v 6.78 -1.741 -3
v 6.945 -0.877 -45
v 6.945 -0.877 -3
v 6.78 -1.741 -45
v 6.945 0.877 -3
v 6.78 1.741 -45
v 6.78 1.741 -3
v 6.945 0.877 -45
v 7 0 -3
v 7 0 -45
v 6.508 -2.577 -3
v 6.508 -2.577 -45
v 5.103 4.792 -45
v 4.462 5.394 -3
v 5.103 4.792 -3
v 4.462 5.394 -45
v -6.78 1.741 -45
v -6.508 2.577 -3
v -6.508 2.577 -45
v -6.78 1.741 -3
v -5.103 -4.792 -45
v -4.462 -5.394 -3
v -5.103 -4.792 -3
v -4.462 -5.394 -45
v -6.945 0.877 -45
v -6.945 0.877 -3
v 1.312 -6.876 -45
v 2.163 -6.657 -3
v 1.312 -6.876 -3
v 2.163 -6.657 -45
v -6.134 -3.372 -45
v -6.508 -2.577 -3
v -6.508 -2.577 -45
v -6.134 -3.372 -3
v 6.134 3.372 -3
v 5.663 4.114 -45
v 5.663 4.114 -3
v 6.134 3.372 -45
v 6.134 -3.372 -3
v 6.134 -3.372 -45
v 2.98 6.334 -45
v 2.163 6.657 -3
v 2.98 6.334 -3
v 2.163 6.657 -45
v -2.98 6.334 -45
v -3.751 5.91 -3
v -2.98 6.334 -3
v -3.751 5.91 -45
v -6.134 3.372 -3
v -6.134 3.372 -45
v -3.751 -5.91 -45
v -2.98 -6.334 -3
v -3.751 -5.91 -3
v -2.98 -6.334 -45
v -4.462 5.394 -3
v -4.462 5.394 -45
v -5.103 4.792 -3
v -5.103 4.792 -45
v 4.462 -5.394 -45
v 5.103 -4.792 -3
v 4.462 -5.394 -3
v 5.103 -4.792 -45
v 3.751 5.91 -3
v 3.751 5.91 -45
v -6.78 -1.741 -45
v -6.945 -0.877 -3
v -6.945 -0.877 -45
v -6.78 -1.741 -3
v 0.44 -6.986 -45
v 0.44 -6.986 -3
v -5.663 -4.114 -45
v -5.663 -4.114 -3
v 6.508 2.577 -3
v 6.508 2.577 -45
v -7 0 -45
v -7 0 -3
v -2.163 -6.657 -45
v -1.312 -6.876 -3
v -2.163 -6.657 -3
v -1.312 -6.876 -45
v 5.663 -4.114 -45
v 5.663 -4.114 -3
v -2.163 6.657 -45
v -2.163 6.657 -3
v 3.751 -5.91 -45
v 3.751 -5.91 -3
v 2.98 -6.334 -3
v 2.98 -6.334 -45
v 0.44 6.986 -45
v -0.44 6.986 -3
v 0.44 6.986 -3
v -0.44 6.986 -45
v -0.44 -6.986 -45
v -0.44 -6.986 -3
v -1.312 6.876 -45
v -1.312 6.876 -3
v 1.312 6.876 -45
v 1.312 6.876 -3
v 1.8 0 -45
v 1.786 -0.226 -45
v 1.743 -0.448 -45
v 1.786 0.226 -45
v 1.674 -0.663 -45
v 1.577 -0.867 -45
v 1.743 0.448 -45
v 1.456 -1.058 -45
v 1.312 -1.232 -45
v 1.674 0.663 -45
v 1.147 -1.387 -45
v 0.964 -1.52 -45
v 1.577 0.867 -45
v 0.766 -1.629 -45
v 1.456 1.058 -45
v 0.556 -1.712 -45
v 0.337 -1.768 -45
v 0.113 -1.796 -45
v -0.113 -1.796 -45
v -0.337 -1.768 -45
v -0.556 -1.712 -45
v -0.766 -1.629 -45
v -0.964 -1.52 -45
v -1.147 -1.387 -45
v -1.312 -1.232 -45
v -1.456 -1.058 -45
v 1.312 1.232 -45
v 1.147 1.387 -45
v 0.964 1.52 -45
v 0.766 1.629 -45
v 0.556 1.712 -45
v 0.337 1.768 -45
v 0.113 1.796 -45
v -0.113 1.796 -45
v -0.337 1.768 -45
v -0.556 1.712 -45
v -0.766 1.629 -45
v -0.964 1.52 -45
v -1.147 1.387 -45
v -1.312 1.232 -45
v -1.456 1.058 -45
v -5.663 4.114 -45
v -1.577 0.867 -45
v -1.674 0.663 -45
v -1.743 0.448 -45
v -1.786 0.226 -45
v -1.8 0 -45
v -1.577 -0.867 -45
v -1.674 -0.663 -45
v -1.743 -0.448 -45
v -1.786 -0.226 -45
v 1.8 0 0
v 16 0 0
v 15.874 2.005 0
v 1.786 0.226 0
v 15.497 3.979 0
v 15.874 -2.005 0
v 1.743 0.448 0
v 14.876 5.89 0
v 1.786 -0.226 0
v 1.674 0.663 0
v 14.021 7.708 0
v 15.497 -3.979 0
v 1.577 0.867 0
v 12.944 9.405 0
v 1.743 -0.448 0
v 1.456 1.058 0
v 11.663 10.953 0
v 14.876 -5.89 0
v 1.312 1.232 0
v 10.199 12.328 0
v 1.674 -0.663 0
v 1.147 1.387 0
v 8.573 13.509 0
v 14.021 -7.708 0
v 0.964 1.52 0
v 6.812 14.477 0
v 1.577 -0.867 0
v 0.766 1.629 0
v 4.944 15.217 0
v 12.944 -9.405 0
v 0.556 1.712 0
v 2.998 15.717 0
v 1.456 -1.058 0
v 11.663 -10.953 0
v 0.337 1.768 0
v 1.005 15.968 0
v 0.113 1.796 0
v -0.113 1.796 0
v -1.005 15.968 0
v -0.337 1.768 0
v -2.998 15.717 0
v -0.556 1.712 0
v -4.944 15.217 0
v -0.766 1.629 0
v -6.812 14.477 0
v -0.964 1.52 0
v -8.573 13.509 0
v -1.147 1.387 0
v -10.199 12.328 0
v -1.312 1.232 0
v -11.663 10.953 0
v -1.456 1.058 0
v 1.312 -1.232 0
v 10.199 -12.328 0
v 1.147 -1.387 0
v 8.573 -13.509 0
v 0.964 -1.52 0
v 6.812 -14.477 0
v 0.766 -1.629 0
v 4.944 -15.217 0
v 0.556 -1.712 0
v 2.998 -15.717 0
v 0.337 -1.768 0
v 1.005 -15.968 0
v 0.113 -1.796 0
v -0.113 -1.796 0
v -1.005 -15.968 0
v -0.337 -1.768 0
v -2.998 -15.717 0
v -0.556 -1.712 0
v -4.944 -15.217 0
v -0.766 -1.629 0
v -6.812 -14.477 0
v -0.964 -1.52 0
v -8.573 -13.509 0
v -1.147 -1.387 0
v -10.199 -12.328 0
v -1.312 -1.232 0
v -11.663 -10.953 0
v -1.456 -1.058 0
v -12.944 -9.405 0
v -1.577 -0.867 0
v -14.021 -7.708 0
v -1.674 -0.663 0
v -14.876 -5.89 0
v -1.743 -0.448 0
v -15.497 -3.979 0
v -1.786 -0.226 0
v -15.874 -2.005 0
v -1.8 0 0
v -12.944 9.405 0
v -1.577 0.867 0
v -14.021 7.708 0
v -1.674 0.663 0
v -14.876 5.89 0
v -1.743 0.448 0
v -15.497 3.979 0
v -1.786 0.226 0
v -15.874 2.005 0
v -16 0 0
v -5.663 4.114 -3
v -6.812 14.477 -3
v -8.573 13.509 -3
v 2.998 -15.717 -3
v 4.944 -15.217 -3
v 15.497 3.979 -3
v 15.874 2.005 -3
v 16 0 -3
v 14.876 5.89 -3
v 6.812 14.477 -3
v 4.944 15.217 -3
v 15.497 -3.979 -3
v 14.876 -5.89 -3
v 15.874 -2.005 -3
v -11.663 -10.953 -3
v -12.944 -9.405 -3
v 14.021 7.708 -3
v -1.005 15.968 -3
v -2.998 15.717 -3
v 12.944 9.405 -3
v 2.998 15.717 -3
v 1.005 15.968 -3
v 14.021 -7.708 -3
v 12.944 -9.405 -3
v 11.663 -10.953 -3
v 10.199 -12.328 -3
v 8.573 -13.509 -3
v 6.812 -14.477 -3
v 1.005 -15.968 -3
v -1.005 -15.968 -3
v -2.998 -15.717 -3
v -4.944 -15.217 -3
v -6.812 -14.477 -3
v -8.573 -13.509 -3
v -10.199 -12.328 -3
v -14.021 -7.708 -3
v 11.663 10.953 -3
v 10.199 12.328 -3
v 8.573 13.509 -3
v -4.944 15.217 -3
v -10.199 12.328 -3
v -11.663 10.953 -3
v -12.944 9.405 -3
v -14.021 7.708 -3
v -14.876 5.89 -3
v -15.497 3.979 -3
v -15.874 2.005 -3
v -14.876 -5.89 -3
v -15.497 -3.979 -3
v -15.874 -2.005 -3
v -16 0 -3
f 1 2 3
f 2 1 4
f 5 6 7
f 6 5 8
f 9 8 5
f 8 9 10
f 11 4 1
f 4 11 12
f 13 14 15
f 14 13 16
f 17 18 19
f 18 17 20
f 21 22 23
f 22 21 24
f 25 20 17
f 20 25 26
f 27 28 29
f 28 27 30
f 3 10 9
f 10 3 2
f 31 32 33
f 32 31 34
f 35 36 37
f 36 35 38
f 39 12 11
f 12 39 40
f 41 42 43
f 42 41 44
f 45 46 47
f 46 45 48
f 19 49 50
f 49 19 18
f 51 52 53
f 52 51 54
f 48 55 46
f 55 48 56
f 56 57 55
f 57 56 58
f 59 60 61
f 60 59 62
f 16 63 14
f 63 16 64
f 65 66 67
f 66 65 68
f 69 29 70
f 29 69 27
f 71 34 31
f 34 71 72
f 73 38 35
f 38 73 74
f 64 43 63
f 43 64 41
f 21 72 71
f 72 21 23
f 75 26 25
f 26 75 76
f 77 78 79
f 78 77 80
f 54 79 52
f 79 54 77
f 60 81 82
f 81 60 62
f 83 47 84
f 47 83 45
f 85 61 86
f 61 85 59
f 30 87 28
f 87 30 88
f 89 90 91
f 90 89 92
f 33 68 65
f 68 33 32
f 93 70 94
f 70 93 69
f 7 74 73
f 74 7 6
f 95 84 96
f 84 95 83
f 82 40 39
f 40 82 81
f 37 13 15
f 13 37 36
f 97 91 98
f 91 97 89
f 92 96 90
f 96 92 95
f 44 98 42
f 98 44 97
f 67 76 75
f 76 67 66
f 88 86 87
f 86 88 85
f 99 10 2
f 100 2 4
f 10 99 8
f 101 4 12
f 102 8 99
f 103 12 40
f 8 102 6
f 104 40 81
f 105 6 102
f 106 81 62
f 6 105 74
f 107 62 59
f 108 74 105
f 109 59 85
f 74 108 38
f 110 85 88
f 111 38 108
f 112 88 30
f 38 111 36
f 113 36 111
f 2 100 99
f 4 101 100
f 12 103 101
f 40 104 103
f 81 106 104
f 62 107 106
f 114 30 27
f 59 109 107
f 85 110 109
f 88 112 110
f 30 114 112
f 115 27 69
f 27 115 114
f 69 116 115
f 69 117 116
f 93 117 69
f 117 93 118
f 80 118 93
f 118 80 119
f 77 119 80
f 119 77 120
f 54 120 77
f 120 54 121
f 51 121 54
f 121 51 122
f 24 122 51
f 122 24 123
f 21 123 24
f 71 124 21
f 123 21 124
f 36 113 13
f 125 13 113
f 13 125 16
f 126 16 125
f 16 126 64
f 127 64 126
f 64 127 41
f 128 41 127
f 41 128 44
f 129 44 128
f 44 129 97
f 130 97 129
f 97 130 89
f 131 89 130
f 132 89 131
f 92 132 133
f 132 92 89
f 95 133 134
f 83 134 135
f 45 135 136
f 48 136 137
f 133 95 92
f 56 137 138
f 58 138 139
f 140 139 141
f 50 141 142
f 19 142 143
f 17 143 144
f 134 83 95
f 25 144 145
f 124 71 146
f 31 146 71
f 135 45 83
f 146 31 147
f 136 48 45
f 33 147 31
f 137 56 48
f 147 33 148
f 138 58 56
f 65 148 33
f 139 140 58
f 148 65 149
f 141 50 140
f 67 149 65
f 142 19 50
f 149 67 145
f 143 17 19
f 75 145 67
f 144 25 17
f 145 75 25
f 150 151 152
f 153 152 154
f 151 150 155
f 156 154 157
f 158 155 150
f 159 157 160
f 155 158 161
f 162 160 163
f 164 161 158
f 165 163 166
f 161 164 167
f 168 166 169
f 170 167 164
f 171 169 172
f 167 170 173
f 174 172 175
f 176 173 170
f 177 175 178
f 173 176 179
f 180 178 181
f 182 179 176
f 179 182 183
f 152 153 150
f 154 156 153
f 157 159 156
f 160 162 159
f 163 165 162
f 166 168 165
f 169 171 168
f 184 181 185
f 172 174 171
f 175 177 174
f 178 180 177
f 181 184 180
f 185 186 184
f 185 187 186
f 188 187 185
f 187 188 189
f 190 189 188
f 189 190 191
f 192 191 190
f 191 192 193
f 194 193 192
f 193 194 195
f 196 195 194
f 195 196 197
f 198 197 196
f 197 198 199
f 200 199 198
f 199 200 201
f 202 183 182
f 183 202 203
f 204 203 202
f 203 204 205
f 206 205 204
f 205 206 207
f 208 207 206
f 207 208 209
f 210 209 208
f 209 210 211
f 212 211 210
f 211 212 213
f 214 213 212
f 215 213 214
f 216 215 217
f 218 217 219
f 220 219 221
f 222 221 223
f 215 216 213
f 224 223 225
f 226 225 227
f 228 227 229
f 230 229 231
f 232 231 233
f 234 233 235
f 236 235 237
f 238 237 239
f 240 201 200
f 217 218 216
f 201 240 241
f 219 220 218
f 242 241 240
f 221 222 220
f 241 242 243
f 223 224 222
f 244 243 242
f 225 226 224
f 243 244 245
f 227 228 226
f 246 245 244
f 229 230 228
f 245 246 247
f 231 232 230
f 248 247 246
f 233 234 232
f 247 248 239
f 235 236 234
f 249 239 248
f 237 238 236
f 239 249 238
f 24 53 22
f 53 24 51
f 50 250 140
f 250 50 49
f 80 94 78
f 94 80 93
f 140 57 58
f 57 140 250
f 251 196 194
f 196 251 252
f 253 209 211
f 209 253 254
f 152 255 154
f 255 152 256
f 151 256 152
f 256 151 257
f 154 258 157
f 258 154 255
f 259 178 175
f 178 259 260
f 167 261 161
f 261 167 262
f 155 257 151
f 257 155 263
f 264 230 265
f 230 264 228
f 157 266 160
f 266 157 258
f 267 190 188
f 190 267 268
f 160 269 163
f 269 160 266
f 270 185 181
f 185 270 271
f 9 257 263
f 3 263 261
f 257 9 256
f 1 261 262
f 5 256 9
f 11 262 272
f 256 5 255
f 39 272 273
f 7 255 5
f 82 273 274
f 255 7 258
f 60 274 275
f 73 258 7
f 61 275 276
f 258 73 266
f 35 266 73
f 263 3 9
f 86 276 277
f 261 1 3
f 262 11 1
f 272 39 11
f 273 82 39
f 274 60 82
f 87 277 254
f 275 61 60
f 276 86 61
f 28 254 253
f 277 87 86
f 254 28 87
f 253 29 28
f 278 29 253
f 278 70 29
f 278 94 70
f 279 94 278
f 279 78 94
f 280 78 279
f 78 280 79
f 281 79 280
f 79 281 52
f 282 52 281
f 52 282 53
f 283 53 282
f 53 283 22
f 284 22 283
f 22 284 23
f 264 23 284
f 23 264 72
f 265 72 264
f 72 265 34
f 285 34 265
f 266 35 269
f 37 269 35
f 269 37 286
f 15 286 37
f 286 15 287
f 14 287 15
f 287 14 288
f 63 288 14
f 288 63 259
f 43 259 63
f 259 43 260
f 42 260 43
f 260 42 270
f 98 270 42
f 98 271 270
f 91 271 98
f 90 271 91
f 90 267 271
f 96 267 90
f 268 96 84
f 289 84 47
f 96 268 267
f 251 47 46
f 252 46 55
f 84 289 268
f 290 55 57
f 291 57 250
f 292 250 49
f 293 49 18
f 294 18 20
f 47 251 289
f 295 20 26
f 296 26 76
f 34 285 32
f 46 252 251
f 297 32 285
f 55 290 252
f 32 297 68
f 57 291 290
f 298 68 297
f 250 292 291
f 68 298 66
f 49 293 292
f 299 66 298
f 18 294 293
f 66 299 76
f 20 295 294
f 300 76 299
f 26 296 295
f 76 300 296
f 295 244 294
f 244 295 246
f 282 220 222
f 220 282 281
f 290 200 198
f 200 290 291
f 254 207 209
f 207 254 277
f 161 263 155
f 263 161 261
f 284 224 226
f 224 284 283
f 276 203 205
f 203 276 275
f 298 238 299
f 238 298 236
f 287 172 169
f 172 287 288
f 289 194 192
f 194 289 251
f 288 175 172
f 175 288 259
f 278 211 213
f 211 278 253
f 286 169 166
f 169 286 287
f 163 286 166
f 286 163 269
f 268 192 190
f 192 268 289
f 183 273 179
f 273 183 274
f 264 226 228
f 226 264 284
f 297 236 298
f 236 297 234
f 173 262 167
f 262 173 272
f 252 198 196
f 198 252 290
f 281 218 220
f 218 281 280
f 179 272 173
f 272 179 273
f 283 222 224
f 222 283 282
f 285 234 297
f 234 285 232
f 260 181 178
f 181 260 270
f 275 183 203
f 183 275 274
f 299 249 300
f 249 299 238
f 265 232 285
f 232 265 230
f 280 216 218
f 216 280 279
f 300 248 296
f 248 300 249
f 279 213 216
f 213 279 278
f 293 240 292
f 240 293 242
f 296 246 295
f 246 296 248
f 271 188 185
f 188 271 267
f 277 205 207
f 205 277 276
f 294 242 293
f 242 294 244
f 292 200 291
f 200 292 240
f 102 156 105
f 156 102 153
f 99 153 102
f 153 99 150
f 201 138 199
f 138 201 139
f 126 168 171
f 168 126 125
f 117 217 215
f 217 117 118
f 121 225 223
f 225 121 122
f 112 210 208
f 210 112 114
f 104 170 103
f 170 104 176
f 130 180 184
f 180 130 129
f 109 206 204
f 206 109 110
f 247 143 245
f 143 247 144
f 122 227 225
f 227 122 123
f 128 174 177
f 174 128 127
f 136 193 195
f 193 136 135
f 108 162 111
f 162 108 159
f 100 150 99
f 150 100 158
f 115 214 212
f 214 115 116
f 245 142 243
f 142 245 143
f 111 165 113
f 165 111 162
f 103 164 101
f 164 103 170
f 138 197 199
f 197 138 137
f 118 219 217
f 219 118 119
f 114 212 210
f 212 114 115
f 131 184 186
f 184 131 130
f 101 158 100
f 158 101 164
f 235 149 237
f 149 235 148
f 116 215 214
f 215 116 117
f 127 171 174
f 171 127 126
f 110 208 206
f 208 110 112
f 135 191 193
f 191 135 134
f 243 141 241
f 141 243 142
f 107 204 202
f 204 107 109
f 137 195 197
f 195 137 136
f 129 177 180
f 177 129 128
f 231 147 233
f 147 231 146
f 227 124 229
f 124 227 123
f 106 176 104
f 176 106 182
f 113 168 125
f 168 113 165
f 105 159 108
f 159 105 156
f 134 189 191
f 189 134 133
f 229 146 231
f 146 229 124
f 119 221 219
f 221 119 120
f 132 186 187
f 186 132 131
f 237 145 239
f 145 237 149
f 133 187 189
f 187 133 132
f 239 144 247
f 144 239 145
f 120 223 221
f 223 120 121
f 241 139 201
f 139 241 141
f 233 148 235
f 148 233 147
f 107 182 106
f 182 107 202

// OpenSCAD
$fn = 50;


difference() {
	union() {
		translate(v = [0, 0, -45.0000000000]) {
			cylinder(h = 45, r = 7.0000000000);
		}
		translate(v = [0, 0, -3.0000000000]) {
			cylinder(h = 3, r = 16.0000000000);
		}
	}
	union() {
		#translate(v = [0, 0, -45]) {
			cylinder(h = 45, r = 1.8000000000);
		}
	}
}
